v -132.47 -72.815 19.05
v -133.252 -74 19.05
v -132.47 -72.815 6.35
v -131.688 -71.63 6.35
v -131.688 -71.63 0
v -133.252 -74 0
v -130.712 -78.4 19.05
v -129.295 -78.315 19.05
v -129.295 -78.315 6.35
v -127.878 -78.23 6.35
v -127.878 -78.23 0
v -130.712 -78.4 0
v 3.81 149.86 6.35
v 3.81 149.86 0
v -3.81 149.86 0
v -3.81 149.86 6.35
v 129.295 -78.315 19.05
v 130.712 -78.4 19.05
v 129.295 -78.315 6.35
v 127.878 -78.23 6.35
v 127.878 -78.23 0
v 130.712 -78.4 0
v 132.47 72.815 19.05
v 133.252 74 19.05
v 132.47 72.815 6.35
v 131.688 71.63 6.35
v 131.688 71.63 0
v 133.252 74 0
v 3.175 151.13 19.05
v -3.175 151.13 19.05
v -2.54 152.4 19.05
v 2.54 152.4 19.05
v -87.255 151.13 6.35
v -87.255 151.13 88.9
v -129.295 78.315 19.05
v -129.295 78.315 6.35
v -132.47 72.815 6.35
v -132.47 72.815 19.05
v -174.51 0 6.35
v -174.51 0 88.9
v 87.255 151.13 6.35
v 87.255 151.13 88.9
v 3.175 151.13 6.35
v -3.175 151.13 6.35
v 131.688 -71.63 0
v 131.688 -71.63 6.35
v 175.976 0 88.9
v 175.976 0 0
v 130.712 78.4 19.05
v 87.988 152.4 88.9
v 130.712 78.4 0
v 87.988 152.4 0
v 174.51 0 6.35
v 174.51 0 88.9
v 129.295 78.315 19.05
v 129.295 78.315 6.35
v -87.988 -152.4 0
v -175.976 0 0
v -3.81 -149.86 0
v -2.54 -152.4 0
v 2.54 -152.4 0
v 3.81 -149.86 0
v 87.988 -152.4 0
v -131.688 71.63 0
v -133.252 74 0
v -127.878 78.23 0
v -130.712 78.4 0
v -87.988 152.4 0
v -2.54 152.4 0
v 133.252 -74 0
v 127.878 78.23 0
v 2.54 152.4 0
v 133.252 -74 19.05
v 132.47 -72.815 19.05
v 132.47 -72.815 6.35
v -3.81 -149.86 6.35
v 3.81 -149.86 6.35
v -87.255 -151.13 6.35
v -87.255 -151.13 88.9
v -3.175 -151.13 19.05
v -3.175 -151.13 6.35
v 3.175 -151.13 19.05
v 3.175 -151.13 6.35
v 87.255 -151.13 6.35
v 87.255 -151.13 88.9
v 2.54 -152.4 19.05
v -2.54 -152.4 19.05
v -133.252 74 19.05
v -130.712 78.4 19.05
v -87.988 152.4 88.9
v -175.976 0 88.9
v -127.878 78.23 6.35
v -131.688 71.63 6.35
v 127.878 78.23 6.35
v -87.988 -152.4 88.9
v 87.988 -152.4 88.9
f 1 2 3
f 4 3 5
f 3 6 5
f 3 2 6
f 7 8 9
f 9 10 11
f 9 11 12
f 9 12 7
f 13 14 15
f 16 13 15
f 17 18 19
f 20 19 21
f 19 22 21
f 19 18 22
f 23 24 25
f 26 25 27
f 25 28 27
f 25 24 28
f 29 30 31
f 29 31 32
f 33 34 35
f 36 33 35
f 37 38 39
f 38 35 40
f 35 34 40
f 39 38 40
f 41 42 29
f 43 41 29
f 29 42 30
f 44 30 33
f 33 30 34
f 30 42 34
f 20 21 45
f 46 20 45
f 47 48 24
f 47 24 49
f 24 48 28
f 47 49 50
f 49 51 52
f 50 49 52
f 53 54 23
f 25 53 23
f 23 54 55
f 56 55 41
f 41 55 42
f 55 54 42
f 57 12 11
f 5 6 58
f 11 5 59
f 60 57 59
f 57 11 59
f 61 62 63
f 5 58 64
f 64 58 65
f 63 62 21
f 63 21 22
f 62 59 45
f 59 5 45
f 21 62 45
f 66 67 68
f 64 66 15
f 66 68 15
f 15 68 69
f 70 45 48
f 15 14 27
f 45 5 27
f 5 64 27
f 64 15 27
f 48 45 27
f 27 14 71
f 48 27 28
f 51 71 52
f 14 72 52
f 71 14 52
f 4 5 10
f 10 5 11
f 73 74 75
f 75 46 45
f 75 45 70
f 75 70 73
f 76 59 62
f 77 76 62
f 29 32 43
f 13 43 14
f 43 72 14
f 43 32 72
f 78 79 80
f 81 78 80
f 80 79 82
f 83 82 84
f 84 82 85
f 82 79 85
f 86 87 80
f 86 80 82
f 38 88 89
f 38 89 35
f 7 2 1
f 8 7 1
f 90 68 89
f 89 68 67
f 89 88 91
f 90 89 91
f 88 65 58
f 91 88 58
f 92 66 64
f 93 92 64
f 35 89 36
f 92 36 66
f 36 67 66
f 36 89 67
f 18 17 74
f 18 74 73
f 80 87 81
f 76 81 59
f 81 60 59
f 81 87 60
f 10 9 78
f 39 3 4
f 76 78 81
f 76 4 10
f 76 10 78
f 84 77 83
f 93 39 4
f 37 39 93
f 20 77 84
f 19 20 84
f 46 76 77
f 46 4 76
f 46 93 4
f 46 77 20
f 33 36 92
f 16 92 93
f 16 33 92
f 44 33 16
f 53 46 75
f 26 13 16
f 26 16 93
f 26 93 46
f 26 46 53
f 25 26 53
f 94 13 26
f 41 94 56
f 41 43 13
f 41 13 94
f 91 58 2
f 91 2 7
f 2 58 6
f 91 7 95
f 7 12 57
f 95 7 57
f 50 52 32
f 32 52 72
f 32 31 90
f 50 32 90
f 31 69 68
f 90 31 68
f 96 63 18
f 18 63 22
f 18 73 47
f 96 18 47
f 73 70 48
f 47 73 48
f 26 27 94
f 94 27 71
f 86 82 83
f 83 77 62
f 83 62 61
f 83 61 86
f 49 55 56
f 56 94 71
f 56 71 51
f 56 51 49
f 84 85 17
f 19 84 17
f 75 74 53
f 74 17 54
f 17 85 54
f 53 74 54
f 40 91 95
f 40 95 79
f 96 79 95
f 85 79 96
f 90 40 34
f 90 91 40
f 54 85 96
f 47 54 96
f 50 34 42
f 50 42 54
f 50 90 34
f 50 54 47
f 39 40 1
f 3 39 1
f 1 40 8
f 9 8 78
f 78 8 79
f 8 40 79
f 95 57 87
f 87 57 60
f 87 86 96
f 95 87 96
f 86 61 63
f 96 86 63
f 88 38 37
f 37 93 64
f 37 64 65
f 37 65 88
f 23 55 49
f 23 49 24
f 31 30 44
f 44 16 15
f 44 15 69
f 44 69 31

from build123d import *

# Parameters (mm, degrees)
F1_DEPTH = 88.9
F3_DEPTH = 19.05
F5_DEPTH = 82.55


with BuildPart() as f1:
    # F0 (on Top) → F1 (new body)
    with BuildSketch(Plane.XY):
        Polygon((-87.988181, -152.4), (87.988181, -152.4), (175.976362, 0), (87.988181, 152.4), (-87.988181, 152.4), (-175.976362, 0), align=None)
    extrude(amount=F1_DEPTH)

    # F2 (on face) → F3 (cut)
    with BuildSketch(Plane(origin=(0, 0, 0), x_dir=(1, 0, 0), z_dir=(0, 0, -1))):
        Polygon((-131.982272, -76.2), (-129.782567, -74.93), (-131.687567, -71.630443), (-133.252272, -74.000295), align=None)
        Polygon((-127.877567, -78.229557), (-129.782567, -74.93), (-131.982272, -76.2), (-130.712272, -78.399705), align=None)
        Polygon((-131.687567, 71.630443), (-129.782567, 74.93), (-131.982272, 76.2), (-133.252272, 74.000295), align=None)
        Polygon((-131.982272, 76.2), (-129.782567, 74.93), (-127.877567, 78.229557), (-130.712272, 78.399705), align=None)
        Polygon((0, 149.86), (0, 152.4), (-2.54, 152.4), (-3.81, 149.86), align=None)
        Polygon((2.54, 152.4), (0, 152.4), (0, 149.86), (3.81, 149.86), align=None)
        Polygon((127.877567, 78.229557), (129.782567, 74.93), (131.982272, 76.2), (130.712272, 78.399705), align=None)
        Polygon((131.982272, 76.2), (129.782567, 74.93), (131.687567, 71.630443), (133.252272, 74.000295), align=None)
        Polygon((131.687567, -71.630443), (129.782567, -74.93), (131.982272, -76.2), (133.252272, -74.000295), align=None)
        Polygon((131.982272, -76.2), (129.782567, -74.93), (127.877567, -78.229557), (130.712272, -78.399705), align=None)
        Polygon((3.81, -149.86), (0, -149.86), (0, -152.4), (2.54, -152.4), align=None)
        Polygon((0, -152.4), (0, -149.86), (-3.81, -149.86), (-2.54, -152.4), align=None)
    extrude(amount=-F3_DEPTH, mode=Mode.SUBTRACT)

    # F4 (on face) → F5 (cut)
    with BuildSketch(Plane.XY.offset(88.9)):
        Polygon((-87.254946, -151.13), (87.254946, -151.13), (174.509892, 0), (87.254946, 151.13), (-87.254946, 151.13), (-174.509892, 0), align=None)
    extrude(amount=-F5_DEPTH, mode=Mode.SUBTRACT)


solid = f1.part
